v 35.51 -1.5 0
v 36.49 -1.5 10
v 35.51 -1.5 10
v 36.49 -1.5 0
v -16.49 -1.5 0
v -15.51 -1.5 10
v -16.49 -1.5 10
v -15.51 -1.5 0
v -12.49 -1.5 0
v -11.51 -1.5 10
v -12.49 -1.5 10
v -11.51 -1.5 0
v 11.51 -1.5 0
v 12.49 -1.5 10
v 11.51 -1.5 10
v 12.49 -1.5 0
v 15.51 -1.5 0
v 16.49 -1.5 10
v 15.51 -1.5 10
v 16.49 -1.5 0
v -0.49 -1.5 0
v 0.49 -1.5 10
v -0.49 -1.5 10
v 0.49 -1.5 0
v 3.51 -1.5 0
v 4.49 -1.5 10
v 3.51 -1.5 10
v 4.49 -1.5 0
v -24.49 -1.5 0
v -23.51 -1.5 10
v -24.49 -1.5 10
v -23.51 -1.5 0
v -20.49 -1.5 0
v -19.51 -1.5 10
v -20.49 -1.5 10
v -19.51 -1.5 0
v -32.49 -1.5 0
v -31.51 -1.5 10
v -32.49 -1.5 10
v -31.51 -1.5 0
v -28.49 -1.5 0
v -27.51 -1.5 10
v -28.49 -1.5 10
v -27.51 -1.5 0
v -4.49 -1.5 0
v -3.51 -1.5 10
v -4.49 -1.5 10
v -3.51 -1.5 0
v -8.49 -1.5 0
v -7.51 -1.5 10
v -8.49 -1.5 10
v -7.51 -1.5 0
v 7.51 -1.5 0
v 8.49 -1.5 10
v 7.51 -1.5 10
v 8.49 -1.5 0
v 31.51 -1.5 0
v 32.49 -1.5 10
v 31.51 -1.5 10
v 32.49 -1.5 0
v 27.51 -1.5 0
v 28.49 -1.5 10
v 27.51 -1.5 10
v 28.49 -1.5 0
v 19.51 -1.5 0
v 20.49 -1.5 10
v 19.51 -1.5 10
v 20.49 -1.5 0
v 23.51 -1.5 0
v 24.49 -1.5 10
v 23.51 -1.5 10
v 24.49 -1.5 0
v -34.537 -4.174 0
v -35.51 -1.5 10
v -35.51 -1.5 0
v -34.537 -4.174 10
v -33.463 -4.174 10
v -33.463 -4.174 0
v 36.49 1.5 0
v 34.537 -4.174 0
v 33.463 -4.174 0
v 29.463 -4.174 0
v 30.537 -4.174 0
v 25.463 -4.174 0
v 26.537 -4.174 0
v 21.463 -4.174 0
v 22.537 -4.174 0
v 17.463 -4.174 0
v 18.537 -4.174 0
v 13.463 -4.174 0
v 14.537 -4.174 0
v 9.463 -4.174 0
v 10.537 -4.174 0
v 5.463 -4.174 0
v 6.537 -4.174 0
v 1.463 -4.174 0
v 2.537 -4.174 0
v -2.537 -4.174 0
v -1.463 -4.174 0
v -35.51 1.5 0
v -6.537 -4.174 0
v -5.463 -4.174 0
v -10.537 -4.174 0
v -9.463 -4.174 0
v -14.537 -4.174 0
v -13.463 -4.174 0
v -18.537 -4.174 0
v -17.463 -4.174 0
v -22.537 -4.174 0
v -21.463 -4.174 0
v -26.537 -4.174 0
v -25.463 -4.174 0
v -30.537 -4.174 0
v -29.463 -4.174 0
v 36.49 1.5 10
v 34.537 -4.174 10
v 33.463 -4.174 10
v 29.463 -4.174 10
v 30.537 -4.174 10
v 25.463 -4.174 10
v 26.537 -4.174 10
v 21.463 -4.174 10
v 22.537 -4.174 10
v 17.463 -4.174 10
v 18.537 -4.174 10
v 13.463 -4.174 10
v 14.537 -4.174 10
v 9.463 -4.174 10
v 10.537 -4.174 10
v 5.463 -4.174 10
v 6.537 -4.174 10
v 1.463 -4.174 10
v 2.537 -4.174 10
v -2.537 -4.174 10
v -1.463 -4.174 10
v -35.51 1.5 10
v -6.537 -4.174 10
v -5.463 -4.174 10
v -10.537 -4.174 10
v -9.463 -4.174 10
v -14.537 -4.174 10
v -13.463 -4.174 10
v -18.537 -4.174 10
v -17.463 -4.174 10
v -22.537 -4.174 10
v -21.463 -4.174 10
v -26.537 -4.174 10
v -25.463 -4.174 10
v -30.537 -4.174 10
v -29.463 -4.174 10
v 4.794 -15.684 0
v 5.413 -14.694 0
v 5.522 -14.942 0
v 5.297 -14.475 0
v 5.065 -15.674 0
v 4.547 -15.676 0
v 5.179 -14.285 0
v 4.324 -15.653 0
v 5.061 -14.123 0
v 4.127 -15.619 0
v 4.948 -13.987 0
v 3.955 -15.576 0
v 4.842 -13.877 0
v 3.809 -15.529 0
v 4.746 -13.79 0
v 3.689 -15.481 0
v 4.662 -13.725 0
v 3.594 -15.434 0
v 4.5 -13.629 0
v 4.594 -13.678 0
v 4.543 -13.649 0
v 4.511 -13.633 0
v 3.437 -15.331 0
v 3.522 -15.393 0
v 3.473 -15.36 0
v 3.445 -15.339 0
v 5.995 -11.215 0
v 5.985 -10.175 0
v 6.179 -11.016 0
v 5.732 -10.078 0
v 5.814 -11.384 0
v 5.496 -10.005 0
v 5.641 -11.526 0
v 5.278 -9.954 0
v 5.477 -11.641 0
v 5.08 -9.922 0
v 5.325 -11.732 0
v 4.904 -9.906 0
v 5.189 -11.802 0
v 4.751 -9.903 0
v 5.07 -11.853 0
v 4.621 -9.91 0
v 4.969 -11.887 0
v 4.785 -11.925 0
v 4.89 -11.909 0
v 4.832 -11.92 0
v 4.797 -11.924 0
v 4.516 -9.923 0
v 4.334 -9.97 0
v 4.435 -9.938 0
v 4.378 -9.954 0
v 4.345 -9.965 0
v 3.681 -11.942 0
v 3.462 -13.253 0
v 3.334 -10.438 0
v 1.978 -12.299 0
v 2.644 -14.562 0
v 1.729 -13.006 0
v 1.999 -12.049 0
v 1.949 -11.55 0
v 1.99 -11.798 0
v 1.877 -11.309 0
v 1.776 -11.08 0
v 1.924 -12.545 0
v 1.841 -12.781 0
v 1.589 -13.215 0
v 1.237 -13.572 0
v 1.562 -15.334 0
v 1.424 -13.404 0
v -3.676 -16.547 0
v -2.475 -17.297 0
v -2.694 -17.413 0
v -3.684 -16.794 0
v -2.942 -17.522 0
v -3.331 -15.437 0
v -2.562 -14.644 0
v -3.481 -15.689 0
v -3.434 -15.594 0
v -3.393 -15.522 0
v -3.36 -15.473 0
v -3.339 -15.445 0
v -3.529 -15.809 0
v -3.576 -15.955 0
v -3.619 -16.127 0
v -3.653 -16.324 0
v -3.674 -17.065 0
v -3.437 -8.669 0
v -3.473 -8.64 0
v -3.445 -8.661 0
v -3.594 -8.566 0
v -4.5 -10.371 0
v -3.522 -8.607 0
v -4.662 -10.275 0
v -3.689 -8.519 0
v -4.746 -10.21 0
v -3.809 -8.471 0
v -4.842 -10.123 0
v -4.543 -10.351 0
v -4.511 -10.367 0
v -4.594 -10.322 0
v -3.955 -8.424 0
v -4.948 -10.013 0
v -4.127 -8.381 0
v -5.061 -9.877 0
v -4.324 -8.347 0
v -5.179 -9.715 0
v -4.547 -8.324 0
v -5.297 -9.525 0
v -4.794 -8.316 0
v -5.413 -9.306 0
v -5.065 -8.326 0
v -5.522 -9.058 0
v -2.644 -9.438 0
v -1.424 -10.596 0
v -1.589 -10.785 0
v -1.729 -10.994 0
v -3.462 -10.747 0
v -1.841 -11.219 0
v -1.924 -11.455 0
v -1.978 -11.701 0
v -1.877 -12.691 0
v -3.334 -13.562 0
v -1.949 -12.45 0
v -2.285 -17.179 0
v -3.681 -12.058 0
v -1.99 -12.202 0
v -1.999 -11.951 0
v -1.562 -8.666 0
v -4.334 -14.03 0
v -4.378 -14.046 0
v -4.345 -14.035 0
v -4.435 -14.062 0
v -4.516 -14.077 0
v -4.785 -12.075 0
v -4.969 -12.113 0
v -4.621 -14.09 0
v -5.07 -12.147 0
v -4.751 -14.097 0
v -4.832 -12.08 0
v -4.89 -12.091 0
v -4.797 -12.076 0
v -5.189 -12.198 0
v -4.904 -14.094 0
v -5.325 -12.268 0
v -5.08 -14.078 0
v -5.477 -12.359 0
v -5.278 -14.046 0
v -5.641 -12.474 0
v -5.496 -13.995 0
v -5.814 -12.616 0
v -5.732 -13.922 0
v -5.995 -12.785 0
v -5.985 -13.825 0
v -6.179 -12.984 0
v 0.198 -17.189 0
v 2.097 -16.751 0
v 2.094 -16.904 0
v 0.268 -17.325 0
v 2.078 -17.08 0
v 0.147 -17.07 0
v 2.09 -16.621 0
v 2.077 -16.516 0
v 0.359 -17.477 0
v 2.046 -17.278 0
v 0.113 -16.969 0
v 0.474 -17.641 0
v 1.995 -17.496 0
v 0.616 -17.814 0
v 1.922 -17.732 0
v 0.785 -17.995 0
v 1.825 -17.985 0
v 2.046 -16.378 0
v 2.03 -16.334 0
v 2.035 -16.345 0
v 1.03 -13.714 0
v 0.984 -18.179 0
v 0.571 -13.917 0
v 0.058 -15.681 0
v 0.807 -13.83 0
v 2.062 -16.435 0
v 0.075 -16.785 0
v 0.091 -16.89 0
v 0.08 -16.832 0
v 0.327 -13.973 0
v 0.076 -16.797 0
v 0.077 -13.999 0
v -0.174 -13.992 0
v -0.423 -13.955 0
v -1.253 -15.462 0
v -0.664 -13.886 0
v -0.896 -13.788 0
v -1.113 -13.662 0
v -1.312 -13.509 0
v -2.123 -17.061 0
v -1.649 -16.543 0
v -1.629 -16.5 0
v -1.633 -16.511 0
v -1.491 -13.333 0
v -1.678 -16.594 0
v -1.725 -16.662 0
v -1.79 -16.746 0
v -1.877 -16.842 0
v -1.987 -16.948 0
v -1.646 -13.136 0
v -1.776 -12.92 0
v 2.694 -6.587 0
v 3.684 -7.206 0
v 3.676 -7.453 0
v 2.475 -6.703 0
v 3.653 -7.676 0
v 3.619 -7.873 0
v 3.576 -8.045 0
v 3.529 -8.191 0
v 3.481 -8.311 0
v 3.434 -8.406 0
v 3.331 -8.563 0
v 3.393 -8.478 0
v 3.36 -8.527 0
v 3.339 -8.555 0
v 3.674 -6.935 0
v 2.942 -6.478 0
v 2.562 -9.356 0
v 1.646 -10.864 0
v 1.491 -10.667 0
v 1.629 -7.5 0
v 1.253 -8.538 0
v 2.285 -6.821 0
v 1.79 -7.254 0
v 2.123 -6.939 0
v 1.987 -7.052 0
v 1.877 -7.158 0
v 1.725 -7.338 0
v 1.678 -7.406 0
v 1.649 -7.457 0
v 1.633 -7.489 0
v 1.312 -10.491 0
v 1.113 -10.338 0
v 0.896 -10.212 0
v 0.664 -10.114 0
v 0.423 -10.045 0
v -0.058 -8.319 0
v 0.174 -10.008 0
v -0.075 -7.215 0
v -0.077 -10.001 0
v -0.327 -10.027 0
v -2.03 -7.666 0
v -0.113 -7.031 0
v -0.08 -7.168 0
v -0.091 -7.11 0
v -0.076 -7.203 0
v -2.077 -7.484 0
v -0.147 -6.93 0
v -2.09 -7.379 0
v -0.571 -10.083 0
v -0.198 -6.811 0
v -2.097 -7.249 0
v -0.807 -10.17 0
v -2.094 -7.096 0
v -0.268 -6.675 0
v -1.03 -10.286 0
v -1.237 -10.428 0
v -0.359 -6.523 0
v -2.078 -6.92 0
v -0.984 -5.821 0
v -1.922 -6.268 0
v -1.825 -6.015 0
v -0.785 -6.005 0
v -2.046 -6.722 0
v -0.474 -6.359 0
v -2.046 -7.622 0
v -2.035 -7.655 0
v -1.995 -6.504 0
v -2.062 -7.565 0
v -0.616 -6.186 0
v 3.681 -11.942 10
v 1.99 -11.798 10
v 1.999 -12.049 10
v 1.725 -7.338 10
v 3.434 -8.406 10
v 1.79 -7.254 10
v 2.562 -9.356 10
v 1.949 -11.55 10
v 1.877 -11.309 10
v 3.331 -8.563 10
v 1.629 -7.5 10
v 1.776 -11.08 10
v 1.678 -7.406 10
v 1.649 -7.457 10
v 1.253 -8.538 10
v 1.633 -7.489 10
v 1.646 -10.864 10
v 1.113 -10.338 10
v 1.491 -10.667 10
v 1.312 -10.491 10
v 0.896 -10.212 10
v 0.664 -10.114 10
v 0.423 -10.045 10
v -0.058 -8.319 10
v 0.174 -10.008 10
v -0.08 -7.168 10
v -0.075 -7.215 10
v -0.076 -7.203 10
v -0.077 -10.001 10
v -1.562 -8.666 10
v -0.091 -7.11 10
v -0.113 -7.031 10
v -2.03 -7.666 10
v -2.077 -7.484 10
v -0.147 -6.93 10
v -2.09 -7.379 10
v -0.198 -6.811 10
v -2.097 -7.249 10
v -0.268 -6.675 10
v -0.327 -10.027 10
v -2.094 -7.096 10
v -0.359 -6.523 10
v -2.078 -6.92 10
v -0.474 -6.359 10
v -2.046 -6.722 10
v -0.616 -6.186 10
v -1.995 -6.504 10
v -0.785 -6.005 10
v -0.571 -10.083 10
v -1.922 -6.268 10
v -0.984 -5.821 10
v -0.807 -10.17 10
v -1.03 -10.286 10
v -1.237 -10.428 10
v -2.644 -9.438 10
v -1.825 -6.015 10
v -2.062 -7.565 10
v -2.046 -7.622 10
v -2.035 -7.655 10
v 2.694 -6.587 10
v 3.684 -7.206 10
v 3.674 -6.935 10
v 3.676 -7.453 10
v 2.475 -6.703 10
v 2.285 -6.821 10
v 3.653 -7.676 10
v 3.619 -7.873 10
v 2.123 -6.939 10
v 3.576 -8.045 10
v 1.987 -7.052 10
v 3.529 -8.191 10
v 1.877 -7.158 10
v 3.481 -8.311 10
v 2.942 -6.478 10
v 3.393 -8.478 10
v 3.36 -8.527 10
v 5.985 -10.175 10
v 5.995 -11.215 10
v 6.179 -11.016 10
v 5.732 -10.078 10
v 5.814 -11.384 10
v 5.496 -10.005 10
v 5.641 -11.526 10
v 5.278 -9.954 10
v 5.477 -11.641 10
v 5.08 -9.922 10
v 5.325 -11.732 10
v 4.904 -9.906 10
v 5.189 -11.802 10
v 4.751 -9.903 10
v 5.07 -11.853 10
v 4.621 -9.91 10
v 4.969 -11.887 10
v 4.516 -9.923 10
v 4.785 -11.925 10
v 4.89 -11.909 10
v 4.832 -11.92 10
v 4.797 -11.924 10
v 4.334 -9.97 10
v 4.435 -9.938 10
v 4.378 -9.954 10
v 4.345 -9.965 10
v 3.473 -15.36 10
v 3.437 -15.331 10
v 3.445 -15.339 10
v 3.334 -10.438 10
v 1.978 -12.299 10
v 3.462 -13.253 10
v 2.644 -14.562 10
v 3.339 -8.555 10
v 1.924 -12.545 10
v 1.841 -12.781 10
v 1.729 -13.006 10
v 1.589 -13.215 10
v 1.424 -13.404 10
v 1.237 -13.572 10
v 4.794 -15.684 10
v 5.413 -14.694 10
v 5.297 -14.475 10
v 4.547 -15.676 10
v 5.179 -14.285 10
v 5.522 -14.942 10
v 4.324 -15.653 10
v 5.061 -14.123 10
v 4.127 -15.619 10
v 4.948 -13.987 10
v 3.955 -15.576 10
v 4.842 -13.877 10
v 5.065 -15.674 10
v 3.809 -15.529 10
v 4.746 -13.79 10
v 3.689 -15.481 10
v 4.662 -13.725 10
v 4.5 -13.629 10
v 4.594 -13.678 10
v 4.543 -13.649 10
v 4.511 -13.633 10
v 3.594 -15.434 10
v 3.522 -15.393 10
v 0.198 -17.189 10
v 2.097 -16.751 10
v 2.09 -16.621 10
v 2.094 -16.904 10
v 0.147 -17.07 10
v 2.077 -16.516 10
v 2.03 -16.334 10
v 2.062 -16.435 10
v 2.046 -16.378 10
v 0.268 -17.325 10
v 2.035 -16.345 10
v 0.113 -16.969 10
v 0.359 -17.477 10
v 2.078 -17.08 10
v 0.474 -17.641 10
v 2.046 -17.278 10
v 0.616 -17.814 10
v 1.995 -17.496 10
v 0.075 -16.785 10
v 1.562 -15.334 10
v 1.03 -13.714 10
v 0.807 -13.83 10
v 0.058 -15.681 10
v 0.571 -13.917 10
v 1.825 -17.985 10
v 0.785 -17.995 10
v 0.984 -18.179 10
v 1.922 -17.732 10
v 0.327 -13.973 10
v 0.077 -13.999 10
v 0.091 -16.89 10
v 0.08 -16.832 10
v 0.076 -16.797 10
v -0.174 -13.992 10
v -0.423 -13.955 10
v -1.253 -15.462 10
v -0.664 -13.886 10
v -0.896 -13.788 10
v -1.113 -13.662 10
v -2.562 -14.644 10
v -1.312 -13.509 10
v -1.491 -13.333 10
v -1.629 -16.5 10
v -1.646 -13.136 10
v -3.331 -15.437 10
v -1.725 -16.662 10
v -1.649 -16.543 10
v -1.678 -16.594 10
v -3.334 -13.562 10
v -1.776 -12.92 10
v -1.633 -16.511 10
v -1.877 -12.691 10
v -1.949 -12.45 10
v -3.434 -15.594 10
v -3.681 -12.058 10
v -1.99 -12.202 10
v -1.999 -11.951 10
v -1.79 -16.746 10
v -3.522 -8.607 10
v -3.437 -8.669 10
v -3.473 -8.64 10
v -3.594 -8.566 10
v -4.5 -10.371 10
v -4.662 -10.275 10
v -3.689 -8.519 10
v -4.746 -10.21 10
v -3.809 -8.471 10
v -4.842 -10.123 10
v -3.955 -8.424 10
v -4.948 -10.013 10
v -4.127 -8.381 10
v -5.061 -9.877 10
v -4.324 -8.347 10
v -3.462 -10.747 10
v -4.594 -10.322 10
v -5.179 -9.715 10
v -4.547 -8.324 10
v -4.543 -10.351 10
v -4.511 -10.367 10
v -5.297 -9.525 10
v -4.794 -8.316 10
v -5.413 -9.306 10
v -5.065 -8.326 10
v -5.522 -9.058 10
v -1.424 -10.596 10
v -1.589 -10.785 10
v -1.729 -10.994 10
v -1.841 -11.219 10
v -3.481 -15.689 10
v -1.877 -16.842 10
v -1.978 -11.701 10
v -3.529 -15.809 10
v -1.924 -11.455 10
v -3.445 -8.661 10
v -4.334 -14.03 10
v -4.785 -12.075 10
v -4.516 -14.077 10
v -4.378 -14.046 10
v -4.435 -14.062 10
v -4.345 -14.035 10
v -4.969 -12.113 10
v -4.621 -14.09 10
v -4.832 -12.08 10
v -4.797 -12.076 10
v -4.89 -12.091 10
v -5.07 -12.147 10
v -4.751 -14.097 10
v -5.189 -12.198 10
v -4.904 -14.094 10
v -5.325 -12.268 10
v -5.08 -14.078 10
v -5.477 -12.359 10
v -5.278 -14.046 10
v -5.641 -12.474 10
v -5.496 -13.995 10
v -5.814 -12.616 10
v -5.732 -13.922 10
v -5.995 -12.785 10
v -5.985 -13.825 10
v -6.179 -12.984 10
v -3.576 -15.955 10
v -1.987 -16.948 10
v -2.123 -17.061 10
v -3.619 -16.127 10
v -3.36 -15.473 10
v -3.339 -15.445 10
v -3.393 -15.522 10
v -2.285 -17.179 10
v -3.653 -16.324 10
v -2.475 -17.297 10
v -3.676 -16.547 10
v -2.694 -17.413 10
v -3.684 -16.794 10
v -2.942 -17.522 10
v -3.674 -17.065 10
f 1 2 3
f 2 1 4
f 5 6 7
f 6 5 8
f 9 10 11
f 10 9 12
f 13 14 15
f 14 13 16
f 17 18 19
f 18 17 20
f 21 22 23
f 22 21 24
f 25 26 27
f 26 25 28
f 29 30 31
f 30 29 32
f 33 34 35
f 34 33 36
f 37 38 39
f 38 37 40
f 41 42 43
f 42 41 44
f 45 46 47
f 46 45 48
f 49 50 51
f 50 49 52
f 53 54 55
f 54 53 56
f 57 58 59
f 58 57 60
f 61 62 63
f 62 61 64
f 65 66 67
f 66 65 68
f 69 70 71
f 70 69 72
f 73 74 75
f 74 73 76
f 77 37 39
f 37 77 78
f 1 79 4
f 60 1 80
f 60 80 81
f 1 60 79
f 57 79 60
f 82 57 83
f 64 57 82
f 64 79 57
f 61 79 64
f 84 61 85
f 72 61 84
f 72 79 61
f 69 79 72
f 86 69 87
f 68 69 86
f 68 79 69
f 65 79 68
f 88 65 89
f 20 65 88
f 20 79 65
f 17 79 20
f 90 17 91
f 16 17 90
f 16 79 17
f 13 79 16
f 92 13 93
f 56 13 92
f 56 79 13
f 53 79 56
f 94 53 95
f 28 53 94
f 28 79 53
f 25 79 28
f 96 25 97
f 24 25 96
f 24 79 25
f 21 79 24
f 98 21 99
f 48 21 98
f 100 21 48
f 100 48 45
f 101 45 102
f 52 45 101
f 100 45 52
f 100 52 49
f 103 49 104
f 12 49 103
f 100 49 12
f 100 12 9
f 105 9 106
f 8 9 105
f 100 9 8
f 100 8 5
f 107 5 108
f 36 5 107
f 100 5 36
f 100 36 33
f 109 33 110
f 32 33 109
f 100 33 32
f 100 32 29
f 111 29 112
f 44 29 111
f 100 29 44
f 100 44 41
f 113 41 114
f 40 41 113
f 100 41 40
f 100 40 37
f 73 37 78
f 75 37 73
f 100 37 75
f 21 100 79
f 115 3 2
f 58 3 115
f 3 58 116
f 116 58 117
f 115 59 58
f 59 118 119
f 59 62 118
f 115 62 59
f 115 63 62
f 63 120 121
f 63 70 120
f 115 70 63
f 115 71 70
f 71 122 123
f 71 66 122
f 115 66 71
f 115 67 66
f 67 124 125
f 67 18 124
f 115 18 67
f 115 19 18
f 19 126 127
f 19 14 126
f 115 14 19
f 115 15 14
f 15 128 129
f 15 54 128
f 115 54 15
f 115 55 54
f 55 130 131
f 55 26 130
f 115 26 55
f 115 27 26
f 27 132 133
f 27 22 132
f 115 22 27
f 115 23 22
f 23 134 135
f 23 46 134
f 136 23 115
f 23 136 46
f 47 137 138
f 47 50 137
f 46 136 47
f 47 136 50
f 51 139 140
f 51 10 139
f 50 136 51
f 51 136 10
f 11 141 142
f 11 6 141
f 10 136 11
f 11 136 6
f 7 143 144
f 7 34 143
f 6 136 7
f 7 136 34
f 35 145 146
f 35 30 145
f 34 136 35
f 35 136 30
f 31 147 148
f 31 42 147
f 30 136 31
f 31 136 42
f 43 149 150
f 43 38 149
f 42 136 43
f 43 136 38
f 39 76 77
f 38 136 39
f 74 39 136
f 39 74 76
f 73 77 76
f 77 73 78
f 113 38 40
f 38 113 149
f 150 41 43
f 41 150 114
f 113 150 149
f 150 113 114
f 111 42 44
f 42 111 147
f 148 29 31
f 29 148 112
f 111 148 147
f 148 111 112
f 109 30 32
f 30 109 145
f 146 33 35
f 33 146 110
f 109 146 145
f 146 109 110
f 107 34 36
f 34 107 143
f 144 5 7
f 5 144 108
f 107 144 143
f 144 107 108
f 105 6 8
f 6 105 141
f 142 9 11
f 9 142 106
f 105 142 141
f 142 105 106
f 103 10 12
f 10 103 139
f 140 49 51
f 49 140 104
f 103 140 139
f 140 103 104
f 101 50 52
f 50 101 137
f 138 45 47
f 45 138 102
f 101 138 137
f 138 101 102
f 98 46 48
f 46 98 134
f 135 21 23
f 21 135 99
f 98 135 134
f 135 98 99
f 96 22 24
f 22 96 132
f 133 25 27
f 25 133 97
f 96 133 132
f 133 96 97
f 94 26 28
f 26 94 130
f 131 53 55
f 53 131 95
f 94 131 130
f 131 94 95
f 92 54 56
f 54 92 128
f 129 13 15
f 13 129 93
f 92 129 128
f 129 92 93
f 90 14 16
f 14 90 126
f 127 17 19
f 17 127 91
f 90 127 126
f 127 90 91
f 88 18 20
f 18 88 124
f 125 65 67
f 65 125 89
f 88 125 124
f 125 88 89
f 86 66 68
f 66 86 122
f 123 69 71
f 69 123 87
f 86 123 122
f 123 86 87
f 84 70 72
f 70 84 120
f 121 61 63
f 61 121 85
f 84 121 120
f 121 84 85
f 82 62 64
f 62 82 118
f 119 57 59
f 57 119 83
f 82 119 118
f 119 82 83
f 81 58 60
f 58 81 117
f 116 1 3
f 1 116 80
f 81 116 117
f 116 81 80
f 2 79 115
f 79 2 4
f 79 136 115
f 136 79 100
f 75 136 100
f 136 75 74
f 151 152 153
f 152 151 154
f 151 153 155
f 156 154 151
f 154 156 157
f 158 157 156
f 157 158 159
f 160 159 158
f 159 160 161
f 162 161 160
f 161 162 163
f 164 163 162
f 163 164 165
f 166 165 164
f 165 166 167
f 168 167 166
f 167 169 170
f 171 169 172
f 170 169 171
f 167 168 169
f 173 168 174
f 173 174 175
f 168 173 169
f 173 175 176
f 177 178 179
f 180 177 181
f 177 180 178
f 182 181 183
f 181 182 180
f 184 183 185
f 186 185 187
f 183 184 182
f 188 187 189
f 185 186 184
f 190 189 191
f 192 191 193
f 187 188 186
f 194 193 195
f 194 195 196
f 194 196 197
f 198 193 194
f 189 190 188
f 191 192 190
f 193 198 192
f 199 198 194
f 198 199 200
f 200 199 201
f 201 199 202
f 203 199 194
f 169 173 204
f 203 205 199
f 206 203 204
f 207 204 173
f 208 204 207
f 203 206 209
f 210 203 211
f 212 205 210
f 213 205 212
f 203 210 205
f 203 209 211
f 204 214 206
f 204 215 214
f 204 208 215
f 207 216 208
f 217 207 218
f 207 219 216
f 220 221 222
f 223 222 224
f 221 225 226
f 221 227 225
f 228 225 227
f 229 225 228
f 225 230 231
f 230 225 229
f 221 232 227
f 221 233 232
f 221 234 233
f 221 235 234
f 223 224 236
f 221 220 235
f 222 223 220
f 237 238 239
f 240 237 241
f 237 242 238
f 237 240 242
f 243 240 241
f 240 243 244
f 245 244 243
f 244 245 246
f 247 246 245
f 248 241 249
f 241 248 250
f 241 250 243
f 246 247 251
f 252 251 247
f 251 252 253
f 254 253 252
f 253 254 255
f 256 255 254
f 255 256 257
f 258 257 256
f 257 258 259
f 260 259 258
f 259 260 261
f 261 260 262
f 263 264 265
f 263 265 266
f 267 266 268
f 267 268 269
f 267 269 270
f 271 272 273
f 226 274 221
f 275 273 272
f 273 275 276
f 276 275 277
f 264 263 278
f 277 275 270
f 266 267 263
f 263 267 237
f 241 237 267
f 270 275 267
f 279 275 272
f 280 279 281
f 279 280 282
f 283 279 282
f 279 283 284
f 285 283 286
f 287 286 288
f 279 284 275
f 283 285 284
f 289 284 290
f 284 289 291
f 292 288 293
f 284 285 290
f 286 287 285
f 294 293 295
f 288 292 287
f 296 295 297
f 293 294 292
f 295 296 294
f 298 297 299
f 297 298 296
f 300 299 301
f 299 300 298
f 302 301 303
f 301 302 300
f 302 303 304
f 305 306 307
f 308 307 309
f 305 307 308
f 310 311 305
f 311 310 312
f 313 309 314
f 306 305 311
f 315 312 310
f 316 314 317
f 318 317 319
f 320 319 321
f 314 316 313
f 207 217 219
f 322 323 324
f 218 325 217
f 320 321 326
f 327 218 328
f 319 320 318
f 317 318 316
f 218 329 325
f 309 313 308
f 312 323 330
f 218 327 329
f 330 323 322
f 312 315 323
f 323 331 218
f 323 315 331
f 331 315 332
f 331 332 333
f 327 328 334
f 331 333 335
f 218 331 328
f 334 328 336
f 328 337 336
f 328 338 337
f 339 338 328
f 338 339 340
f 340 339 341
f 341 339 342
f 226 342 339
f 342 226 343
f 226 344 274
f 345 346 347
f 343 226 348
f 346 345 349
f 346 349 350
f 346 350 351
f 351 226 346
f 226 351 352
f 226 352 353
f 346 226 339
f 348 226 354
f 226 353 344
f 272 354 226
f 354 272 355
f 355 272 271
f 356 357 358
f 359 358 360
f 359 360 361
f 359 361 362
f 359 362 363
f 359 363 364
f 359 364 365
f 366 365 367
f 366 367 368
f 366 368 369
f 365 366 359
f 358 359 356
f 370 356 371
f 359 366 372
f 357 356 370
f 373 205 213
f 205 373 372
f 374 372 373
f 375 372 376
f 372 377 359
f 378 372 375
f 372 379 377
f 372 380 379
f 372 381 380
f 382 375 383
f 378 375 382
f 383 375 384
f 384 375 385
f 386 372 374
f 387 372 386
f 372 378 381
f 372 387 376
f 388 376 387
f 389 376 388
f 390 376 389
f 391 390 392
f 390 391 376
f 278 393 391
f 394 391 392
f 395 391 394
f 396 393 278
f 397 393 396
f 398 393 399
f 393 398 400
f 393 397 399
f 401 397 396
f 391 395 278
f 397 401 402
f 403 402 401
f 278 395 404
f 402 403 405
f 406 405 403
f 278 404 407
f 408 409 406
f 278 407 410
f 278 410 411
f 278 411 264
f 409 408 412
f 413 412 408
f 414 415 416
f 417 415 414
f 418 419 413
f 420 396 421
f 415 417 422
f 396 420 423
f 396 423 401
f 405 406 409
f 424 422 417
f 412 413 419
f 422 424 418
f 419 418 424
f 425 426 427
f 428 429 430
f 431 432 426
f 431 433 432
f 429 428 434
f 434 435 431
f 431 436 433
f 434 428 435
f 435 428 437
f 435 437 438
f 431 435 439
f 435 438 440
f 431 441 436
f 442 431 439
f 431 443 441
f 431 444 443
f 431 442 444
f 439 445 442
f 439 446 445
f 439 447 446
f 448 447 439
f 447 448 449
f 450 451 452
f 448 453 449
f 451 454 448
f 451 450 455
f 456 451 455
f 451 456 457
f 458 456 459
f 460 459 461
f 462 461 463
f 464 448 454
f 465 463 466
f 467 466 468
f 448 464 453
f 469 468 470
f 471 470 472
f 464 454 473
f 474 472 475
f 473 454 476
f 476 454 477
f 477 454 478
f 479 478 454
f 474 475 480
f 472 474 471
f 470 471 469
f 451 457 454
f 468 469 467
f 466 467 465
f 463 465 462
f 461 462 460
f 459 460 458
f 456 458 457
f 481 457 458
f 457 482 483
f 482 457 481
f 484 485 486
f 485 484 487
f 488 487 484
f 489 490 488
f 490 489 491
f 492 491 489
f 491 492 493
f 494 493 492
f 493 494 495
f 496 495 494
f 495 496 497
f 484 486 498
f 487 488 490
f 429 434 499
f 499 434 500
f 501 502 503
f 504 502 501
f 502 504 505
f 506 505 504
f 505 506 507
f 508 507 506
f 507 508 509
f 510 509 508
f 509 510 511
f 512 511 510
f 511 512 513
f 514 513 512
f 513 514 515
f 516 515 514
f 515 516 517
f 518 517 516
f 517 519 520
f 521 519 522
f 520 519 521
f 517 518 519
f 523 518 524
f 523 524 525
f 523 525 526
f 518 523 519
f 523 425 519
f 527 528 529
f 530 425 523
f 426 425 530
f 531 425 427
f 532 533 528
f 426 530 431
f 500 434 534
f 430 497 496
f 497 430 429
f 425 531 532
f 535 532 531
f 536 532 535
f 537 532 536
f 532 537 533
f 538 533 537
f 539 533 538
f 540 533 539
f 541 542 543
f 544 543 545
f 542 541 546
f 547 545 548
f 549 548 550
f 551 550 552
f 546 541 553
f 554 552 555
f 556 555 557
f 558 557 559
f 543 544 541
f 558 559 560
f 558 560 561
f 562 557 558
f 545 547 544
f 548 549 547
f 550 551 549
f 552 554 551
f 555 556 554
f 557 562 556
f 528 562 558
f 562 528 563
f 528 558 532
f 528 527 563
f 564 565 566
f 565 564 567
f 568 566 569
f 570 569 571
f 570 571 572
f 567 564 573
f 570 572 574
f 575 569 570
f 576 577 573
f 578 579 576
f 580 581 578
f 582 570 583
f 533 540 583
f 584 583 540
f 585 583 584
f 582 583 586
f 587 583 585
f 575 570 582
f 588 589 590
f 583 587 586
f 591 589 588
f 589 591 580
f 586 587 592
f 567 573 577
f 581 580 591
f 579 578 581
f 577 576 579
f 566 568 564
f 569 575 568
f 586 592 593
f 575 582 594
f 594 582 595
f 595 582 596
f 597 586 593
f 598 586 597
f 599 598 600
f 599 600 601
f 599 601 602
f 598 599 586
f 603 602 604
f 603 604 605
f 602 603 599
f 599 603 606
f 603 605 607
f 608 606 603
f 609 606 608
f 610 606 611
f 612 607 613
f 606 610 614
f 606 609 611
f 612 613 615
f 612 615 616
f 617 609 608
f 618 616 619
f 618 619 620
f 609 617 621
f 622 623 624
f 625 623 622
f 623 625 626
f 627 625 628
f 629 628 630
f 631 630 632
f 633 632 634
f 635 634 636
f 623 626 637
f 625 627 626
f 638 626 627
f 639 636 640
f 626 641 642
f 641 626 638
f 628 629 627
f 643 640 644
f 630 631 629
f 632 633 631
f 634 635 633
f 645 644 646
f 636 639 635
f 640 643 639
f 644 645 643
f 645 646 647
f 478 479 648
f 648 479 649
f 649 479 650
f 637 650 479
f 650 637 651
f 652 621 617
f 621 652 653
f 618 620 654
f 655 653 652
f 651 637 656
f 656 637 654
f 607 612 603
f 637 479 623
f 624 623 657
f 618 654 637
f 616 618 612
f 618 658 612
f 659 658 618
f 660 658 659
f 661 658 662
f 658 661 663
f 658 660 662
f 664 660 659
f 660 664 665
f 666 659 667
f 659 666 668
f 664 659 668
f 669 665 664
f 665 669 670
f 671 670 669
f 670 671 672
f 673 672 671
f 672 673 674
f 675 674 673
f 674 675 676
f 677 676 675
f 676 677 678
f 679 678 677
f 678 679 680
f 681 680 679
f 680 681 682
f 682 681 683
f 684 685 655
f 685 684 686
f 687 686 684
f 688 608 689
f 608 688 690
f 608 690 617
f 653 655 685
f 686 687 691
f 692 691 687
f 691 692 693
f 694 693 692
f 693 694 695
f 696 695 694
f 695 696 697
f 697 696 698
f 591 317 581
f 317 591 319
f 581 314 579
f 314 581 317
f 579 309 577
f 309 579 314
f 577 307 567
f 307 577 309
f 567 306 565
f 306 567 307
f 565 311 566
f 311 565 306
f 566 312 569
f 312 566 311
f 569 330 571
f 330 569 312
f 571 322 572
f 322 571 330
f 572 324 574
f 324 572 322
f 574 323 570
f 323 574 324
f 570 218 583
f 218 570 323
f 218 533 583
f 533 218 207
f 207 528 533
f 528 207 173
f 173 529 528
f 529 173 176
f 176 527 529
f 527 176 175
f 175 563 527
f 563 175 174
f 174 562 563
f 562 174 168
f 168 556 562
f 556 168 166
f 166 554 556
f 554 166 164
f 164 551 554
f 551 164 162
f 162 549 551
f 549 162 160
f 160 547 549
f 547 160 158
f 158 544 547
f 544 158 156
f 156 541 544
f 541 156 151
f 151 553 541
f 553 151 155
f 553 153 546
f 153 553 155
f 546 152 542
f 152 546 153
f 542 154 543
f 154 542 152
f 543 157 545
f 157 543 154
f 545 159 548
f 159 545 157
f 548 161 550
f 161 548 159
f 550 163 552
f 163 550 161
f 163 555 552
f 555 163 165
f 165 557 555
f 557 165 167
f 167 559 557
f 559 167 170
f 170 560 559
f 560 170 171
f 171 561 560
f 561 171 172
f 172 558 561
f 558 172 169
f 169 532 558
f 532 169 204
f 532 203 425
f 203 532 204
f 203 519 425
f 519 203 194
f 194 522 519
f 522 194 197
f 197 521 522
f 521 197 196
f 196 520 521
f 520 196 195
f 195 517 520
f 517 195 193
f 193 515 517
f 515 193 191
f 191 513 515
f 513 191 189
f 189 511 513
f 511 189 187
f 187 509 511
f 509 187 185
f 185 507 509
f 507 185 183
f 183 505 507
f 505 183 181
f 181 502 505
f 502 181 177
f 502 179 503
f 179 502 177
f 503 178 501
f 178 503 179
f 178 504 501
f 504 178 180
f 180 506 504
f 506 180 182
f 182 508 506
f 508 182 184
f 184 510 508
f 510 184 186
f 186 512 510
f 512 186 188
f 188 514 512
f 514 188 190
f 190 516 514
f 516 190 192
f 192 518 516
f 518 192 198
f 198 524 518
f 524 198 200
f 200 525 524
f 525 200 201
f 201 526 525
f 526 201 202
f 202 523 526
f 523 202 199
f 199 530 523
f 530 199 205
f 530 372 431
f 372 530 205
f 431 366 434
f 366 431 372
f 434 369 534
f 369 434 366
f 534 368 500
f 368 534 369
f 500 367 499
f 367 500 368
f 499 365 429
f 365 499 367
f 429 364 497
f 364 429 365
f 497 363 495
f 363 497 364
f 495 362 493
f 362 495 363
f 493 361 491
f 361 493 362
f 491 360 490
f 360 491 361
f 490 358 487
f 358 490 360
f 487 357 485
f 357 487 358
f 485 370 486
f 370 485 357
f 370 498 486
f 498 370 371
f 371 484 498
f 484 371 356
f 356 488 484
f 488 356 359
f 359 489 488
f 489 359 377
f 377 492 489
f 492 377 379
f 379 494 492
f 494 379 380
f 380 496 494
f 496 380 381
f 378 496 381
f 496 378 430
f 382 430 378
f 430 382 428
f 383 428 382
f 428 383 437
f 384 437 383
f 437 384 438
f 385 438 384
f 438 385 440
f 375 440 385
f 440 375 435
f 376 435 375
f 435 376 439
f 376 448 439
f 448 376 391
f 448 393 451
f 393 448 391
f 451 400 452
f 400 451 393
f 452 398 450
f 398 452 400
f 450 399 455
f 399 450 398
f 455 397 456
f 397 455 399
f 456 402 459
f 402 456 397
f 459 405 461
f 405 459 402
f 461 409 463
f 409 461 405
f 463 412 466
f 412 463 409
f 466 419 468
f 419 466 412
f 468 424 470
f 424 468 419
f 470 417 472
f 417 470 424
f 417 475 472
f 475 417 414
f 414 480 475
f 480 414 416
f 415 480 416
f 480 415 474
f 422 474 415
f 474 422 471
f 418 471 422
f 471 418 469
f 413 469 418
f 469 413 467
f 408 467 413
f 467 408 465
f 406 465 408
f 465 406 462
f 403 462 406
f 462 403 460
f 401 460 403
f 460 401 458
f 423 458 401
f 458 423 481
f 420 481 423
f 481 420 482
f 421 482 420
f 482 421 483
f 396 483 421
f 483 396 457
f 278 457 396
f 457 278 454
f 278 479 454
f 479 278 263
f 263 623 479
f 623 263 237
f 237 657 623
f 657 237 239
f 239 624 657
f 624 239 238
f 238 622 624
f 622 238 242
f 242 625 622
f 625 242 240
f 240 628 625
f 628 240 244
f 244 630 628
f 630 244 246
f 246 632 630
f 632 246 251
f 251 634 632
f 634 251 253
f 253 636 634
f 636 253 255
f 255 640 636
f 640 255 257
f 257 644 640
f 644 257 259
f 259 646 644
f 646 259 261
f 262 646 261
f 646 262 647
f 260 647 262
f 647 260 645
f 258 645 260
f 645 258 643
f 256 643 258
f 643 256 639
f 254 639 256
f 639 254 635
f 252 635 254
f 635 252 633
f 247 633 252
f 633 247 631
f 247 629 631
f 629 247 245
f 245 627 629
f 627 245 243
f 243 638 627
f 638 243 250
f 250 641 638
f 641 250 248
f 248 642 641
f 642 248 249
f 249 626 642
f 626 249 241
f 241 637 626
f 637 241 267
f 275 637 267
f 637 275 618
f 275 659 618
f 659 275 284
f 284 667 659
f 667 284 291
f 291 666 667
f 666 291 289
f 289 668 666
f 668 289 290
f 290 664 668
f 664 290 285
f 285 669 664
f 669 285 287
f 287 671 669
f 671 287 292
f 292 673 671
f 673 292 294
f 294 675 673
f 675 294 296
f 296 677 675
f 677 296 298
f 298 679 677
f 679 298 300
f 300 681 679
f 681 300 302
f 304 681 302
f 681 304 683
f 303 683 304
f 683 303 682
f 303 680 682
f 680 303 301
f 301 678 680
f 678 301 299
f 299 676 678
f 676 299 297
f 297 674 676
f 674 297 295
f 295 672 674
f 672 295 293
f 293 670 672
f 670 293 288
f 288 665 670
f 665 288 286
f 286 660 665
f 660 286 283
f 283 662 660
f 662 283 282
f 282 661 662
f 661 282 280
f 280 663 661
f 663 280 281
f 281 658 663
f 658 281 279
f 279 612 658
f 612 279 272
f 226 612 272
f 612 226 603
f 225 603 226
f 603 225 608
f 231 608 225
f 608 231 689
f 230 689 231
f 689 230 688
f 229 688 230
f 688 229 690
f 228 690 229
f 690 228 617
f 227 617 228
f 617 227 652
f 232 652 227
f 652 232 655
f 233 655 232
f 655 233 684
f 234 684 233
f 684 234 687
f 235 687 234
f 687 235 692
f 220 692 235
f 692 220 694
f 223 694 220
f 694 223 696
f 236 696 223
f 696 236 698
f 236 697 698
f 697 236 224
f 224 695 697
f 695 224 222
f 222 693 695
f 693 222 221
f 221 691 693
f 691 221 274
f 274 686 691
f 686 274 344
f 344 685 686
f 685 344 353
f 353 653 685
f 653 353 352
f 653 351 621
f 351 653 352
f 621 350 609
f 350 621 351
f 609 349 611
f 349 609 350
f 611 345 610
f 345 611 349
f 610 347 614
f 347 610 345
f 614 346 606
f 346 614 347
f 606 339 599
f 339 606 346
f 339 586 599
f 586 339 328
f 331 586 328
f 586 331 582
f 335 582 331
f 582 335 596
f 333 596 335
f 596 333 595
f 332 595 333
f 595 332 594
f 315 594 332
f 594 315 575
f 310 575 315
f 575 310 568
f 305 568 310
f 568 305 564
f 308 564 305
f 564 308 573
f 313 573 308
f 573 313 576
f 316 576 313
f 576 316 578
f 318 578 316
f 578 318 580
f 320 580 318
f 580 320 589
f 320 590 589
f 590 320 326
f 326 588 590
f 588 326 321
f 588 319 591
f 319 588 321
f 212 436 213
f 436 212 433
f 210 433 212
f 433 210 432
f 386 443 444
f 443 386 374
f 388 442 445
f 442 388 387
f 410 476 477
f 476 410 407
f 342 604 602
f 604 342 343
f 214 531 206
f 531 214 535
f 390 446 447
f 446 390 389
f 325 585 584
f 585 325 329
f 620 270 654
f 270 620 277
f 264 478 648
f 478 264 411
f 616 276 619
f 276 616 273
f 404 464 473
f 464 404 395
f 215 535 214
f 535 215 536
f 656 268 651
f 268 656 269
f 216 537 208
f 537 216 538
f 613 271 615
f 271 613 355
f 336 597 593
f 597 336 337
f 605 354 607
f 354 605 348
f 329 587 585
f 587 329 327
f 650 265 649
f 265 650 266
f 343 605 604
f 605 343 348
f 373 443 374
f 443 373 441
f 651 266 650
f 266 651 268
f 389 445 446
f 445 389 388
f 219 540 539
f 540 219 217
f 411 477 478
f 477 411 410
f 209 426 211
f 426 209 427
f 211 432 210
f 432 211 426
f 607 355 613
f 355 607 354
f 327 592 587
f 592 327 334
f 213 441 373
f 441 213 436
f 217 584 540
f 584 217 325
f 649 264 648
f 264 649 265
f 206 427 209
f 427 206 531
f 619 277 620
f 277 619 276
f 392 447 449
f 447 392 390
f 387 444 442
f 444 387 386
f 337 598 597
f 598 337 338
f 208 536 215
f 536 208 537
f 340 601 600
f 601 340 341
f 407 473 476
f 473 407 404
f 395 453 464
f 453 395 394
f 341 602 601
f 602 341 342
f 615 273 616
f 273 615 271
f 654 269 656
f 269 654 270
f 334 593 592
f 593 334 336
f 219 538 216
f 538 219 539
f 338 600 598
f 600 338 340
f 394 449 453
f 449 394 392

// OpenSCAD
// Rack and pinion gears GPL (c) SASA October 2013.
//
// Very simple rack and pinion gear based on GPL code.
//
// I've made corrections to both rack and gear code I used (below) and unified
// and simplified both bits of code.  Corrects the use of circular pitch so
// rack and pinion match nicely.  Ammendments to the code and interface to
// simplify use and improve readability. Many bells and whistles dropped in
// favour of being dead simple.  I also opted for hard wiring the pressure
// angle to 20 degrees since this seemed a kind of standard.
//
// Based on the works (thanks!): Parametric Involute Bevel and Spur Gears by
// GregFrost GNU GPL license.  http://www.thingiverse.com/thing:3575 Parametric
// Modular Rack by Mark "Ckaos" Moissette GNU GPL license.  (Rack based on the
// work of MattMoses and Fdavies
// http://forums.reprap.org/read.php?1,51452,52099#msg-52099 and Forrest Higgs:
// 
// The originals have many fine additions such as helical gears which I've
// dropped in favour of simplicity (as befits my needs) - it wouldn't be a big
// jobs to nobble my changes backwards or their features forwards.

pi=3.1415926535897932384626433832795;
$fn=50;

// examples of usage
// include this in your code:
// use <rack_and_pinion.scad>
// then:
// a simple rack
// rack(4,20,10,1);//CP (mm/tooth), width (teeth), thickness(of base) (mm), # teeth
// a simple pinion and translation / rotation to make it mesh the rack
// translate([0,-8.5,0])rotate([0,0,360/10/2]) pinion(4,10,10,5);


rack (4,18,10,3);

translate([0,-12,0]) rotate([0,0,13]) pinion(4,8,10,4);


module rack(cp, N, width, thickness){
// cp = circular pitch - for rack = pitch in mm/per tooth
// N = number of teeth
// width = width of rack in teeth
// thickness = thickness of support under teeth (0 for no support)

	a = 1.0*cp/pi; // addendum (also known as "module")
	d = 1.1*cp/pi; // dedendum (this is set by a standard)
	height=(d+a);

	// find the tangent of pressure angle once
	tanPA = tan(20);
	// length of bottom and top horizontal segments of tooth profile
	botL = (cp/2 - 2*d*tanPA);
	topL = (cp/2 - 2*a*tanPA);

	slantLng=tanPA*height;
	realBase=2*slantLng+topL;

	offset=topL+botL+2*slantLng;
	length=(realBase+botL)*N;

	supportSize=width;
	translate([botL/2,0,0])
	rotate([90,0,0]){
		translate([0,supportSize/2,0]){
			union(){
				cube(size=[length,width,thickness],center=true);
				for (i = [0:N-1]){
					translate([i*offset-length/2+realBase/2,0,thickness/2]){
						trapezoid([topL,supportSize],[realBase,supportSize],height);
						}
					}
				}
			}
		}
	}

module pinion (cp, N, width, shaft_diameter, backlash=0){
// cp= circular pitch - for pinion pitch in mm/per as measured along the ptich radius (~1/2 way up tooth)
// N= number of teeth
// width= width of the gear
// shaft_diameter= diameter of hole for shaft
// backlash - I think this is just a bodge for making things fit when printed but I never tested it

	if (cp==false && diametral_pitch==false) 
		echo("MCAD ERROR: pinion module needs either a diametral_pitch or cp");

	//Convert diametrial pitch to our native circular pitch
	cp = (cp!=false?cp:180/diametral_pitch);

	// Pitch diameter: Diameter of pitch circle.
	pitch_diameter  =  N * cp / pi;
	pitch_radius = pitch_diameter/2;
	echo ("Teeth:", N, " Pitch radius:", pitch_radius);
	// Base Circle
	base_radius = pitch_radius*cos(20);

	// Addendum: Radial distance from pitch circle to outside circle.
	addendum = cp/pi;

	//Outer Circle
	outer_radius = pitch_radius+addendum;

	// Dedendum: Radial distance from pitch circle to root diameter
	dedendum = addendum*1.1;

	// Root diameter: Diameter of bottom of tooth spaces.
	root_radius = pitch_radius-dedendum;

	backlash_angle = backlash / pitch_radius * 180 / pi;
	half_thick_angle = (360 / N - backlash_angle) / 4;

	difference(){
		linear_extrude (height=width, convexity=10, twist=0)
		pinion_shape(N, pitch_radius = pitch_radius, root_radius = root_radius,
			base_radius = base_radius, outer_radius = outer_radius,
			half_thick_angle = half_thick_angle, involute_facets=0);

		translate([0,0,-1]) cylinder(r=shaft_diameter/2,h=2+width);
		}

	echo("Root radius =",root_radius,"\nPitch radius=",pitch_radius,"\n Tip radius=",outer_radius,"\n");
	}

module pinion_shape ( N, pitch_radius, root_radius, base_radius, outer_radius, half_thick_angle, involute_facets) {
	union(){
		rotate (half_thick_angle) circle ($fn=N*2, r=root_radius);
		for (i = [1:N]) {
			rotate ([0,0,i*360/N]) {
				involute_pinion_tooth (
					pitch_radius = pitch_radius,
					root_radius = root_radius,
					base_radius = base_radius,
					outer_radius = outer_radius,
					half_thick_angle = half_thick_angle,
					involute_facets=involute_facets);
				}
			}
		}
	}

module involute_pinion_tooth ( pitch_radius, root_radius, base_radius, outer_radius, half_thick_angle, involute_facets) {
	min_radius = max (base_radius,root_radius);

	pitch_point = involute (base_radius, involute_intersect_angle (base_radius, pitch_radius));
	pitch_angle = atan2 (pitch_point[1], pitch_point[0]);
	centre_angle = pitch_angle + half_thick_angle;

	start_angle = involute_intersect_angle (base_radius, min_radius);
	stop_angle = involute_intersect_angle (base_radius, outer_radius);

	res=(involute_facets!=0)?involute_facets:($fn==0)?5:$fn/4;

	union () {
		for (i=[1:res])
        {
		point1=involute (base_radius,start_angle+(stop_angle - start_angle)*(i-1)/res);
        point2=involute (base_radius,start_angle+(stop_angle - start_angle)*i/res);
            
			
				side1_point1=rotate_point (centre_angle, point1);
				side1_point2=rotate_point (centre_angle, point2);
				side2_point1=mirror_point (rotate_point (centre_angle, point1));
				side2_point2=mirror_point (rotate_point (centre_angle, point2));
                
				polygon ( points=[[0,0],side1_point1,side1_point2,side2_point2,side2_point1], paths=[[0,1,2,3,4,0]]);
				
			}
		}
	}

// Mathematical Functions
//===============

// Finds the angle of the involute about the base radius at the given distance (radius) from it's center.
//source: http://www.mathhelpforum.com/math-help/geometry/136011-circle-involute-solving-y-any-given-x.html

function involute_intersect_angle (base_radius, radius) = sqrt (pow (radius/base_radius, 2) - 1) * 180 / pi;

// Calculate the involute position for a given base radius and involute angle.

function rotated_involute(rotate,base_radius,involute_angle)=[cos(rotate)*involute(base_radius, involute_angle)[0]+sin(rotate)*involute(base_radius, involute_angle)[1],cos(rotate)*involute(base_radius, involute_angle)[1]-sin(rotate)*involute(base_radius, involute_angle)[0]];

function mirror_point(coord)=[coord[0],-coord[1]];

function rotate_point(rotate,coord)=[cos(rotate)*coord[0]+sin(rotate)*coord[1],cos(rotate)*coord[1]-sin(rotate)*coord[0]];

function involute (base_radius, involute_angle)=[base_radius*(cos(involute_angle)+involute_angle*pi/180*sin(involute_angle)),base_radius*(sin(involute_angle)-involute_angle*pi/180*cos(involute_angle))];




module trapezoid(top,base,height){
	//echo ("test",base[0]);
	basePT1=[ -base[0]/2, base[1]/2, 0];
	basePT2=[ base[0]/2, base[1]/2, 0];
	basePT3=[ base[0]/2, -base[1]/2, 0];
	basePT4=[ -base[0]/2, -base[1]/2, 0];
	topPT1=[ -top[0]/2, top[1]/2, height];
	topPT2=[ top[0]/2, top[1]/2, height];
	topPT3=[ top[0]/2, -top[1]/2, height];
	topPT4=[ -top[0]/2, -top[1]/2, height];
	polyhedron(points=[ basePT1, basePT2, basePT3, basePT4, topPT1, topPT2, topPT3, topPT4],faces=[[0,1,2], [0,2,3],[3,7,0], [7,4,0],[1,6,2], [1,5,6],[2,6,3], [3,6,7],[5,1,0],[4,5,0],[7,5,4],[5,7,6]]);
	}
